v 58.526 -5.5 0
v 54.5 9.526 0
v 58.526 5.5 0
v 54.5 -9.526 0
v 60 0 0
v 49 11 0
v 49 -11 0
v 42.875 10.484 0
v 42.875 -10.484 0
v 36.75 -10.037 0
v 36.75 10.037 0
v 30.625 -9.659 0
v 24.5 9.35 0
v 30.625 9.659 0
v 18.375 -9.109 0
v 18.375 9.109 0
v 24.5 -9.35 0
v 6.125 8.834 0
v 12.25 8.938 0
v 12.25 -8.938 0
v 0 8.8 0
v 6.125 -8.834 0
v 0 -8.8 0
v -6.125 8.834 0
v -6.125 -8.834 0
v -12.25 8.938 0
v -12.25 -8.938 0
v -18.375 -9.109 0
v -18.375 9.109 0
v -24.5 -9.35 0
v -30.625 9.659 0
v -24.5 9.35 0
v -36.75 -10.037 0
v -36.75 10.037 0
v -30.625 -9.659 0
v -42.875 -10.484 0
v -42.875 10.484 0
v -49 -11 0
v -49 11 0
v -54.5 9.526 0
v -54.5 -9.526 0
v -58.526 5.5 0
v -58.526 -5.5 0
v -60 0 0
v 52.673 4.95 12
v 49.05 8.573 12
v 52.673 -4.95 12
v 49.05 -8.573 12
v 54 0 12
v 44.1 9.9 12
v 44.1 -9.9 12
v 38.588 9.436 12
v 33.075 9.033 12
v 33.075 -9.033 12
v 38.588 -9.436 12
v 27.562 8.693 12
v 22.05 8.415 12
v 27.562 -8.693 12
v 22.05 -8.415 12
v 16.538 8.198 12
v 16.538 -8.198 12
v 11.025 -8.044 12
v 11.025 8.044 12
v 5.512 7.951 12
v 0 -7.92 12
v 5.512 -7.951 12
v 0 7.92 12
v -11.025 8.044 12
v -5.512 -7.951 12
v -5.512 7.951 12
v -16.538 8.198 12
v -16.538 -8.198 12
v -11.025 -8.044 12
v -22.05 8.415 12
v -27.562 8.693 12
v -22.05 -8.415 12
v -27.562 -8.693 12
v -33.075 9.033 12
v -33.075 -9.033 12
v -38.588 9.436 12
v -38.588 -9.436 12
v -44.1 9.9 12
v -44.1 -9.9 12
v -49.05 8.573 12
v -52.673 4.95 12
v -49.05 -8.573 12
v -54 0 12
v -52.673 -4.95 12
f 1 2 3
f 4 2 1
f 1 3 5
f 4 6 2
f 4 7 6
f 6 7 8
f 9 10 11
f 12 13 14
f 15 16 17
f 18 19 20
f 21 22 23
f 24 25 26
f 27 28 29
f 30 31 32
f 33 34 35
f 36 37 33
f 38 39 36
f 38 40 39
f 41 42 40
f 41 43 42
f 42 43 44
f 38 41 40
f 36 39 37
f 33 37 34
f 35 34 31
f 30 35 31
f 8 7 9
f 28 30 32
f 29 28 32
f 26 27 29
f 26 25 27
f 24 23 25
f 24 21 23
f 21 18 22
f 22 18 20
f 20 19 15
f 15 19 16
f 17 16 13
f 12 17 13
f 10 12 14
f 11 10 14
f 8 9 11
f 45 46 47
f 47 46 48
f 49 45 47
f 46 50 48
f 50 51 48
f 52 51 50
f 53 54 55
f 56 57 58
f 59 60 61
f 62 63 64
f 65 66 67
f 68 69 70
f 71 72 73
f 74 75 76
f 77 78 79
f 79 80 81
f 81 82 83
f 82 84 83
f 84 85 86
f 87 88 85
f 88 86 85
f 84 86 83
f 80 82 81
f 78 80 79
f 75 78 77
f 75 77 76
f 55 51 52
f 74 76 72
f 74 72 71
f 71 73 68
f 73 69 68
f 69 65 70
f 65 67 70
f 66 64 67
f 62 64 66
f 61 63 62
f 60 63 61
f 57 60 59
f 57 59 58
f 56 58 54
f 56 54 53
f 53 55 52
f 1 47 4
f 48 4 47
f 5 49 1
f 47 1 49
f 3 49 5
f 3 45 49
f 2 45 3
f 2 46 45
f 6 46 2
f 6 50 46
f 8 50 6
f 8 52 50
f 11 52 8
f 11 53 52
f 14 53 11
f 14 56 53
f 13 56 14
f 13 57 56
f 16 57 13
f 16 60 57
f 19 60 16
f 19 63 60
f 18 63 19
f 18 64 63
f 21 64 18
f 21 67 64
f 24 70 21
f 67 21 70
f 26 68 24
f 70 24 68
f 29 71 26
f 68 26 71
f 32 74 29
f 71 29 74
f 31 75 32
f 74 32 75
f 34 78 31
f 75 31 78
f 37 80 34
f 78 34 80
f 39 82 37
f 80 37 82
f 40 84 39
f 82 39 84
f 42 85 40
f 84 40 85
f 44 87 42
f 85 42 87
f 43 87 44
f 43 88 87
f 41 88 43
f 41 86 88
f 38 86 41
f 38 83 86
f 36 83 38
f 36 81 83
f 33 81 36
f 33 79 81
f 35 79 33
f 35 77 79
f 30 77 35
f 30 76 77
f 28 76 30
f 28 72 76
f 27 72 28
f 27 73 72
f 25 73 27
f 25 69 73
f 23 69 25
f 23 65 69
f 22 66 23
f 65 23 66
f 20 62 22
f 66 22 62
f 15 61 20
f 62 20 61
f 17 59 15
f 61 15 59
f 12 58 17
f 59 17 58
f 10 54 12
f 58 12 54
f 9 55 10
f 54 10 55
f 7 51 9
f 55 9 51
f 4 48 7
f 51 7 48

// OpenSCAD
$fn = 32;

// ----------------------------------------------------------------------
// Handle: 120 x 22 mm grip, 12 mm thick
// ----------------------------------------------------------------------

// --- parameters (mm) ---
length = 120;             // grip length
width = 22;               // grip width
thickness = 12;           // grip thickness
waist = 0.8;              // width factor at the middle
draft = 0.9;              // top face scale of the extrusion

/* ergonomic grip outline, closed spline-like polygon in the XY plane */
grip = [[-49, 11], [-42.875, 10.484], [-36.75, 10.037], [-30.625, 9.659], [-24.5, 9.35], [-18.375, 9.109], [-12.25, 8.938], [-6.125, 8.834], [0, 8.8], [6.125, 8.834], [12.25, 8.938], [18.375, 9.109], [24.5, 9.35], [30.625, 9.659], [36.75, 10.037], [42.875, 10.484], [49, 11], [54.5, 9.526], [58.526, 5.5], [60, 0], [58.526, -5.5], [54.5, -9.526], [49, -11], [49, -11], [42.875, -10.484], [36.75, -10.037], [30.625, -9.659], [24.5, -9.35], [18.375, -9.109], [12.25, -8.938], [6.125, -8.834], [0, -8.8], [-6.125, -8.834], [-12.25, -8.938], [-18.375, -9.109], [-24.5, -9.35], [-30.625, -9.659], [-36.75, -10.037], [-42.875, -10.484], [-49, -11], [-54.5, -9.526], [-58.526, -5.5], [-60, 0], [-58.526, 5.5], [-54.5, 9.526], [-49, 11]];

module grip_body() {
  linear_extrude(height = thickness, scale = draft) polygon(grip);
}

difference() {
  union() {
    grip_body();
  }
}
